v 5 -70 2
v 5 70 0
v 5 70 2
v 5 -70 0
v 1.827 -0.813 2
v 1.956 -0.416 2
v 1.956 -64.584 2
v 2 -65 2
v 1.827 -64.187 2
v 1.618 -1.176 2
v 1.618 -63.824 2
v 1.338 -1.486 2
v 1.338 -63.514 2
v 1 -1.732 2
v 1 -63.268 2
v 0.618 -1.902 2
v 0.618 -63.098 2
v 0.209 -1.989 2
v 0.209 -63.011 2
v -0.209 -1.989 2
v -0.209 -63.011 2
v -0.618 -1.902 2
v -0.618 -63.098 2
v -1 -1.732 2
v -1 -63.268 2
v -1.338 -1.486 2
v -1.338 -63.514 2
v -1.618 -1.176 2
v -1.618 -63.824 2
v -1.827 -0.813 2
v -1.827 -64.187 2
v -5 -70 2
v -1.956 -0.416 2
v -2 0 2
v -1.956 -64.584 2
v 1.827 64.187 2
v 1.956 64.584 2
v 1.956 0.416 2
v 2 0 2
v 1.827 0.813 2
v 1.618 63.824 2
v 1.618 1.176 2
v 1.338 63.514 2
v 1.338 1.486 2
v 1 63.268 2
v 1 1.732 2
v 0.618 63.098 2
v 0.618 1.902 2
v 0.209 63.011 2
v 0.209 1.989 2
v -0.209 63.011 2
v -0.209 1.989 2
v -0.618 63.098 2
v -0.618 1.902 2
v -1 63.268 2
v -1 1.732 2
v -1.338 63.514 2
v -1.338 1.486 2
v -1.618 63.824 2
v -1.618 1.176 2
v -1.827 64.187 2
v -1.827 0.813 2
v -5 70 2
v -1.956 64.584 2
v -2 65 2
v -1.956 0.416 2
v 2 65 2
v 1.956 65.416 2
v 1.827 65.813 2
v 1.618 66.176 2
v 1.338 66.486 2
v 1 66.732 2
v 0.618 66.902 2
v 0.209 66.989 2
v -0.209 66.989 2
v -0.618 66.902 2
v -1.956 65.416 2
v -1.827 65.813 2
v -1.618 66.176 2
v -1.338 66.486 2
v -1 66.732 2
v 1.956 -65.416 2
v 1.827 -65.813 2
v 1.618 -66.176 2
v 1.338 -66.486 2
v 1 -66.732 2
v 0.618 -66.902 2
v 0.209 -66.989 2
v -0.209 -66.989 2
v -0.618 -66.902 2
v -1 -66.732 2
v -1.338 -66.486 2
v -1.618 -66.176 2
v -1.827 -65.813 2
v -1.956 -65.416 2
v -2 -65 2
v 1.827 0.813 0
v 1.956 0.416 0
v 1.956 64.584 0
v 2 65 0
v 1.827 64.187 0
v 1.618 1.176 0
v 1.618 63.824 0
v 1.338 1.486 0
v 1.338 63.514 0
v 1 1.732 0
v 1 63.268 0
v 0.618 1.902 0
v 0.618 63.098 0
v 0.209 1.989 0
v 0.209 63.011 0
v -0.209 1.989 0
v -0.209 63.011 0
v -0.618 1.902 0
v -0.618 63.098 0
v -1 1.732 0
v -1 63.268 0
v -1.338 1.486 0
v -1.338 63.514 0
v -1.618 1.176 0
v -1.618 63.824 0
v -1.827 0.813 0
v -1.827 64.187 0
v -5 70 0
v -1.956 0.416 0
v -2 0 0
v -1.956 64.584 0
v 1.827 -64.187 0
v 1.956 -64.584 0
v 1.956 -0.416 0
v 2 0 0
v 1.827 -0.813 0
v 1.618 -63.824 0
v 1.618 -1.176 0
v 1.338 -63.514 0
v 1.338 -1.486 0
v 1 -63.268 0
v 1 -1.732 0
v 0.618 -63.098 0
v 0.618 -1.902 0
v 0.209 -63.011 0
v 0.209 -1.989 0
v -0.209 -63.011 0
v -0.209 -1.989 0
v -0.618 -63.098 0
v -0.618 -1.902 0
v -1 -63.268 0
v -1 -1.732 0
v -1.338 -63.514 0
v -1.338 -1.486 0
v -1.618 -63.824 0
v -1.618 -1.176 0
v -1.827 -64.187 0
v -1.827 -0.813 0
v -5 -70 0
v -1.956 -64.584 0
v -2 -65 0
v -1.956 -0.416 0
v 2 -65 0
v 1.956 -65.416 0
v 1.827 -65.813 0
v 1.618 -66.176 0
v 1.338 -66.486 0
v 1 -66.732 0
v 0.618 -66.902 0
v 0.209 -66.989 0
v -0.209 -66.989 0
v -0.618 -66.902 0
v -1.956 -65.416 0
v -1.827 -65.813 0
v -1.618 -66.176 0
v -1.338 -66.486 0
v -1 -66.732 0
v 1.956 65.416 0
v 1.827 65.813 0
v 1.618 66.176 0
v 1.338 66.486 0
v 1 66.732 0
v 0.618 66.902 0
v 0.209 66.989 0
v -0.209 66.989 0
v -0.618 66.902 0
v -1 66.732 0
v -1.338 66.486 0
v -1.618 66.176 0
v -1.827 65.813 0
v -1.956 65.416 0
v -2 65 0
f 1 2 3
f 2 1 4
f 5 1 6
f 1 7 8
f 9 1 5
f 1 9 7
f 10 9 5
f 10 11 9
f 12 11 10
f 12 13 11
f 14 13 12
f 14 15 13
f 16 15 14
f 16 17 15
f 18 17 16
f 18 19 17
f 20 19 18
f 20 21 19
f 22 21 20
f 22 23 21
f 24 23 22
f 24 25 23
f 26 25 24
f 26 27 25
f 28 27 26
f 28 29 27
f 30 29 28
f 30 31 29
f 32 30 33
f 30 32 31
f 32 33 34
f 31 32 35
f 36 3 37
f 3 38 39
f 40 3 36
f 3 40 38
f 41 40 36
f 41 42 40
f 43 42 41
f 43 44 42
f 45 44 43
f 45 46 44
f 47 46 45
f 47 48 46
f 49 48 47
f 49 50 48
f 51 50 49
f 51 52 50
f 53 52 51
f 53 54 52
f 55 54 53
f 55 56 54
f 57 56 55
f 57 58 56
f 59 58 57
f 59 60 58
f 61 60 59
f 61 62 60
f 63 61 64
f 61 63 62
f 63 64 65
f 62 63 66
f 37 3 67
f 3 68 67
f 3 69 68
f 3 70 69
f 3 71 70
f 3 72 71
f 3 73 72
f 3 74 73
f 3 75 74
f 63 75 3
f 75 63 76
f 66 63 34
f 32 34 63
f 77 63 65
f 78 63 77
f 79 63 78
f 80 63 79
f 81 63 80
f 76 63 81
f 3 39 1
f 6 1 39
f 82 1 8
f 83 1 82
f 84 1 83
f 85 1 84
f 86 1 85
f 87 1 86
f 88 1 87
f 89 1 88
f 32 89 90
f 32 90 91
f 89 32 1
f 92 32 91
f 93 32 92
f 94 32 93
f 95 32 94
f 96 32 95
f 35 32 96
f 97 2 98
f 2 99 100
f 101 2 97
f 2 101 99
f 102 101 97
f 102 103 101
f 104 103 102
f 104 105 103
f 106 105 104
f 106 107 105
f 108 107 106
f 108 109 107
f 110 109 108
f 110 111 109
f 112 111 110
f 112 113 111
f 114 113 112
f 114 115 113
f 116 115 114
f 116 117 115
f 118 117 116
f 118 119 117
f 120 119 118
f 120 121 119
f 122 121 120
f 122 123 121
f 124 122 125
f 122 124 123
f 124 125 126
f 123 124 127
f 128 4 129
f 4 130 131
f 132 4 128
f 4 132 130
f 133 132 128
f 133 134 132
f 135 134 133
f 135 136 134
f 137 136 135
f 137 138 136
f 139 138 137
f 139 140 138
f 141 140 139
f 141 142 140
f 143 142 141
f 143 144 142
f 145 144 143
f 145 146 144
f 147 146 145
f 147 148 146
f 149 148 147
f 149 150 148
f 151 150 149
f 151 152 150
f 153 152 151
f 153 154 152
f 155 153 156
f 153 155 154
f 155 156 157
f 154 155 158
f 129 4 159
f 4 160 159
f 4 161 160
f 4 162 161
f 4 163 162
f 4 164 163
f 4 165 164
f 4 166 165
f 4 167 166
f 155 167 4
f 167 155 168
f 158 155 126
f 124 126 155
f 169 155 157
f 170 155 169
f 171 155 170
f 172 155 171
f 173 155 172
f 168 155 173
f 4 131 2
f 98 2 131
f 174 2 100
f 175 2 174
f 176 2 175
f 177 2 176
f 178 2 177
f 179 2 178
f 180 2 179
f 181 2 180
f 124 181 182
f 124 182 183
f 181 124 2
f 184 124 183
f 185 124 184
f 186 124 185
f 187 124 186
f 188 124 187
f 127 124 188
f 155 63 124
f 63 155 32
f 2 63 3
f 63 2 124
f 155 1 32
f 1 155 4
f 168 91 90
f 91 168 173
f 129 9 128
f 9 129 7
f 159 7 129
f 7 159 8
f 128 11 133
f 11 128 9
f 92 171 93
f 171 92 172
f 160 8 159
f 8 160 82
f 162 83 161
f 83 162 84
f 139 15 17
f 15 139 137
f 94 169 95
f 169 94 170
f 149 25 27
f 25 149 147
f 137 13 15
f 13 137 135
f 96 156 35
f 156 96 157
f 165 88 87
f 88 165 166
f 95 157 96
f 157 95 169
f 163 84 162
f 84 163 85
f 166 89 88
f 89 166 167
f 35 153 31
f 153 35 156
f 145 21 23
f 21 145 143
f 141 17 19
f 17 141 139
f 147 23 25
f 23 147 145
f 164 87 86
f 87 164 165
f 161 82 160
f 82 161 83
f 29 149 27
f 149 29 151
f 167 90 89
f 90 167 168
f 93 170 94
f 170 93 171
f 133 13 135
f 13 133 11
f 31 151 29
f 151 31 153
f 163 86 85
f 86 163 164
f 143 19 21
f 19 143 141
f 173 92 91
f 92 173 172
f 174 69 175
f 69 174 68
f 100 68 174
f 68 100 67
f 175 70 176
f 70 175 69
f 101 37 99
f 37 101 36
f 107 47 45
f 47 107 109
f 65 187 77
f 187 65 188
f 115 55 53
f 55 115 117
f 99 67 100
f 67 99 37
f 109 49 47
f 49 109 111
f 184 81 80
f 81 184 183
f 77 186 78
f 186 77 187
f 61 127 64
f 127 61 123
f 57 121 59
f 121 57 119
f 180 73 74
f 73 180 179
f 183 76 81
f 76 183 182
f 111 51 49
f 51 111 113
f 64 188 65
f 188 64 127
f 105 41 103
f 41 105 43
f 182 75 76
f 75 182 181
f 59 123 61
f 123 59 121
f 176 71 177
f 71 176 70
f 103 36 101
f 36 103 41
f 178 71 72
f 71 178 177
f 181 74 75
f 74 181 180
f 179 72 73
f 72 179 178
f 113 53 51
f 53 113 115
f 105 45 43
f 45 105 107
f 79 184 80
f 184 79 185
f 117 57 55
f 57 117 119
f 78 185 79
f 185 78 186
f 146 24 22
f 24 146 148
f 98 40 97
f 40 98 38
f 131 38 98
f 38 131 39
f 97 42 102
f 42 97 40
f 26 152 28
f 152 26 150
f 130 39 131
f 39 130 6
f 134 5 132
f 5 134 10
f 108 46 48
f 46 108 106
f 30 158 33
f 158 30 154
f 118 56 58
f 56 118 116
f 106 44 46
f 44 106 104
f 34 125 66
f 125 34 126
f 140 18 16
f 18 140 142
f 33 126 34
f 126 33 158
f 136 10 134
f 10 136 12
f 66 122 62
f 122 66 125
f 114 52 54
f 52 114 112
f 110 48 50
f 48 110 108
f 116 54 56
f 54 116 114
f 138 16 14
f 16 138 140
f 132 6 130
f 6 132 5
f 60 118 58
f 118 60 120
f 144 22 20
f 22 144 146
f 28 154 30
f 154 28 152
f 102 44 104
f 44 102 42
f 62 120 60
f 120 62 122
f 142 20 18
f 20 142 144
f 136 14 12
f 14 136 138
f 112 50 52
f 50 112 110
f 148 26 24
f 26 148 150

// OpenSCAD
BAR_WIDTH = 10;
BAR_THICKNESS = 2;
BAR_LENGTH = 140; // 100;

MOUNT_HOLE_DIA = 4;
MOUNT_HOLE_SPACING = 130; // 80s;

MIDDLE_HOLE = true;

$fn = 30;

module bar() {
  difference() {
    translate([-BAR_WIDTH/2, -BAR_LENGTH/2, 0])
    cube(size = [BAR_WIDTH, BAR_LENGTH, BAR_THICKNESS]);
    
    translate([0, -MOUNT_HOLE_SPACING/2, 0])
    cylinder(d = MOUNT_HOLE_DIA, h = BAR_THICKNESS);
    
    translate([0, MOUNT_HOLE_SPACING/2, 0])
    cylinder(d = MOUNT_HOLE_DIA, h = BAR_THICKNESS);
    
    if(MIDDLE_HOLE) {
      cylinder(d = MOUNT_HOLE_DIA, h = BAR_THICKNESS);
    }
  }  
}

bar();
